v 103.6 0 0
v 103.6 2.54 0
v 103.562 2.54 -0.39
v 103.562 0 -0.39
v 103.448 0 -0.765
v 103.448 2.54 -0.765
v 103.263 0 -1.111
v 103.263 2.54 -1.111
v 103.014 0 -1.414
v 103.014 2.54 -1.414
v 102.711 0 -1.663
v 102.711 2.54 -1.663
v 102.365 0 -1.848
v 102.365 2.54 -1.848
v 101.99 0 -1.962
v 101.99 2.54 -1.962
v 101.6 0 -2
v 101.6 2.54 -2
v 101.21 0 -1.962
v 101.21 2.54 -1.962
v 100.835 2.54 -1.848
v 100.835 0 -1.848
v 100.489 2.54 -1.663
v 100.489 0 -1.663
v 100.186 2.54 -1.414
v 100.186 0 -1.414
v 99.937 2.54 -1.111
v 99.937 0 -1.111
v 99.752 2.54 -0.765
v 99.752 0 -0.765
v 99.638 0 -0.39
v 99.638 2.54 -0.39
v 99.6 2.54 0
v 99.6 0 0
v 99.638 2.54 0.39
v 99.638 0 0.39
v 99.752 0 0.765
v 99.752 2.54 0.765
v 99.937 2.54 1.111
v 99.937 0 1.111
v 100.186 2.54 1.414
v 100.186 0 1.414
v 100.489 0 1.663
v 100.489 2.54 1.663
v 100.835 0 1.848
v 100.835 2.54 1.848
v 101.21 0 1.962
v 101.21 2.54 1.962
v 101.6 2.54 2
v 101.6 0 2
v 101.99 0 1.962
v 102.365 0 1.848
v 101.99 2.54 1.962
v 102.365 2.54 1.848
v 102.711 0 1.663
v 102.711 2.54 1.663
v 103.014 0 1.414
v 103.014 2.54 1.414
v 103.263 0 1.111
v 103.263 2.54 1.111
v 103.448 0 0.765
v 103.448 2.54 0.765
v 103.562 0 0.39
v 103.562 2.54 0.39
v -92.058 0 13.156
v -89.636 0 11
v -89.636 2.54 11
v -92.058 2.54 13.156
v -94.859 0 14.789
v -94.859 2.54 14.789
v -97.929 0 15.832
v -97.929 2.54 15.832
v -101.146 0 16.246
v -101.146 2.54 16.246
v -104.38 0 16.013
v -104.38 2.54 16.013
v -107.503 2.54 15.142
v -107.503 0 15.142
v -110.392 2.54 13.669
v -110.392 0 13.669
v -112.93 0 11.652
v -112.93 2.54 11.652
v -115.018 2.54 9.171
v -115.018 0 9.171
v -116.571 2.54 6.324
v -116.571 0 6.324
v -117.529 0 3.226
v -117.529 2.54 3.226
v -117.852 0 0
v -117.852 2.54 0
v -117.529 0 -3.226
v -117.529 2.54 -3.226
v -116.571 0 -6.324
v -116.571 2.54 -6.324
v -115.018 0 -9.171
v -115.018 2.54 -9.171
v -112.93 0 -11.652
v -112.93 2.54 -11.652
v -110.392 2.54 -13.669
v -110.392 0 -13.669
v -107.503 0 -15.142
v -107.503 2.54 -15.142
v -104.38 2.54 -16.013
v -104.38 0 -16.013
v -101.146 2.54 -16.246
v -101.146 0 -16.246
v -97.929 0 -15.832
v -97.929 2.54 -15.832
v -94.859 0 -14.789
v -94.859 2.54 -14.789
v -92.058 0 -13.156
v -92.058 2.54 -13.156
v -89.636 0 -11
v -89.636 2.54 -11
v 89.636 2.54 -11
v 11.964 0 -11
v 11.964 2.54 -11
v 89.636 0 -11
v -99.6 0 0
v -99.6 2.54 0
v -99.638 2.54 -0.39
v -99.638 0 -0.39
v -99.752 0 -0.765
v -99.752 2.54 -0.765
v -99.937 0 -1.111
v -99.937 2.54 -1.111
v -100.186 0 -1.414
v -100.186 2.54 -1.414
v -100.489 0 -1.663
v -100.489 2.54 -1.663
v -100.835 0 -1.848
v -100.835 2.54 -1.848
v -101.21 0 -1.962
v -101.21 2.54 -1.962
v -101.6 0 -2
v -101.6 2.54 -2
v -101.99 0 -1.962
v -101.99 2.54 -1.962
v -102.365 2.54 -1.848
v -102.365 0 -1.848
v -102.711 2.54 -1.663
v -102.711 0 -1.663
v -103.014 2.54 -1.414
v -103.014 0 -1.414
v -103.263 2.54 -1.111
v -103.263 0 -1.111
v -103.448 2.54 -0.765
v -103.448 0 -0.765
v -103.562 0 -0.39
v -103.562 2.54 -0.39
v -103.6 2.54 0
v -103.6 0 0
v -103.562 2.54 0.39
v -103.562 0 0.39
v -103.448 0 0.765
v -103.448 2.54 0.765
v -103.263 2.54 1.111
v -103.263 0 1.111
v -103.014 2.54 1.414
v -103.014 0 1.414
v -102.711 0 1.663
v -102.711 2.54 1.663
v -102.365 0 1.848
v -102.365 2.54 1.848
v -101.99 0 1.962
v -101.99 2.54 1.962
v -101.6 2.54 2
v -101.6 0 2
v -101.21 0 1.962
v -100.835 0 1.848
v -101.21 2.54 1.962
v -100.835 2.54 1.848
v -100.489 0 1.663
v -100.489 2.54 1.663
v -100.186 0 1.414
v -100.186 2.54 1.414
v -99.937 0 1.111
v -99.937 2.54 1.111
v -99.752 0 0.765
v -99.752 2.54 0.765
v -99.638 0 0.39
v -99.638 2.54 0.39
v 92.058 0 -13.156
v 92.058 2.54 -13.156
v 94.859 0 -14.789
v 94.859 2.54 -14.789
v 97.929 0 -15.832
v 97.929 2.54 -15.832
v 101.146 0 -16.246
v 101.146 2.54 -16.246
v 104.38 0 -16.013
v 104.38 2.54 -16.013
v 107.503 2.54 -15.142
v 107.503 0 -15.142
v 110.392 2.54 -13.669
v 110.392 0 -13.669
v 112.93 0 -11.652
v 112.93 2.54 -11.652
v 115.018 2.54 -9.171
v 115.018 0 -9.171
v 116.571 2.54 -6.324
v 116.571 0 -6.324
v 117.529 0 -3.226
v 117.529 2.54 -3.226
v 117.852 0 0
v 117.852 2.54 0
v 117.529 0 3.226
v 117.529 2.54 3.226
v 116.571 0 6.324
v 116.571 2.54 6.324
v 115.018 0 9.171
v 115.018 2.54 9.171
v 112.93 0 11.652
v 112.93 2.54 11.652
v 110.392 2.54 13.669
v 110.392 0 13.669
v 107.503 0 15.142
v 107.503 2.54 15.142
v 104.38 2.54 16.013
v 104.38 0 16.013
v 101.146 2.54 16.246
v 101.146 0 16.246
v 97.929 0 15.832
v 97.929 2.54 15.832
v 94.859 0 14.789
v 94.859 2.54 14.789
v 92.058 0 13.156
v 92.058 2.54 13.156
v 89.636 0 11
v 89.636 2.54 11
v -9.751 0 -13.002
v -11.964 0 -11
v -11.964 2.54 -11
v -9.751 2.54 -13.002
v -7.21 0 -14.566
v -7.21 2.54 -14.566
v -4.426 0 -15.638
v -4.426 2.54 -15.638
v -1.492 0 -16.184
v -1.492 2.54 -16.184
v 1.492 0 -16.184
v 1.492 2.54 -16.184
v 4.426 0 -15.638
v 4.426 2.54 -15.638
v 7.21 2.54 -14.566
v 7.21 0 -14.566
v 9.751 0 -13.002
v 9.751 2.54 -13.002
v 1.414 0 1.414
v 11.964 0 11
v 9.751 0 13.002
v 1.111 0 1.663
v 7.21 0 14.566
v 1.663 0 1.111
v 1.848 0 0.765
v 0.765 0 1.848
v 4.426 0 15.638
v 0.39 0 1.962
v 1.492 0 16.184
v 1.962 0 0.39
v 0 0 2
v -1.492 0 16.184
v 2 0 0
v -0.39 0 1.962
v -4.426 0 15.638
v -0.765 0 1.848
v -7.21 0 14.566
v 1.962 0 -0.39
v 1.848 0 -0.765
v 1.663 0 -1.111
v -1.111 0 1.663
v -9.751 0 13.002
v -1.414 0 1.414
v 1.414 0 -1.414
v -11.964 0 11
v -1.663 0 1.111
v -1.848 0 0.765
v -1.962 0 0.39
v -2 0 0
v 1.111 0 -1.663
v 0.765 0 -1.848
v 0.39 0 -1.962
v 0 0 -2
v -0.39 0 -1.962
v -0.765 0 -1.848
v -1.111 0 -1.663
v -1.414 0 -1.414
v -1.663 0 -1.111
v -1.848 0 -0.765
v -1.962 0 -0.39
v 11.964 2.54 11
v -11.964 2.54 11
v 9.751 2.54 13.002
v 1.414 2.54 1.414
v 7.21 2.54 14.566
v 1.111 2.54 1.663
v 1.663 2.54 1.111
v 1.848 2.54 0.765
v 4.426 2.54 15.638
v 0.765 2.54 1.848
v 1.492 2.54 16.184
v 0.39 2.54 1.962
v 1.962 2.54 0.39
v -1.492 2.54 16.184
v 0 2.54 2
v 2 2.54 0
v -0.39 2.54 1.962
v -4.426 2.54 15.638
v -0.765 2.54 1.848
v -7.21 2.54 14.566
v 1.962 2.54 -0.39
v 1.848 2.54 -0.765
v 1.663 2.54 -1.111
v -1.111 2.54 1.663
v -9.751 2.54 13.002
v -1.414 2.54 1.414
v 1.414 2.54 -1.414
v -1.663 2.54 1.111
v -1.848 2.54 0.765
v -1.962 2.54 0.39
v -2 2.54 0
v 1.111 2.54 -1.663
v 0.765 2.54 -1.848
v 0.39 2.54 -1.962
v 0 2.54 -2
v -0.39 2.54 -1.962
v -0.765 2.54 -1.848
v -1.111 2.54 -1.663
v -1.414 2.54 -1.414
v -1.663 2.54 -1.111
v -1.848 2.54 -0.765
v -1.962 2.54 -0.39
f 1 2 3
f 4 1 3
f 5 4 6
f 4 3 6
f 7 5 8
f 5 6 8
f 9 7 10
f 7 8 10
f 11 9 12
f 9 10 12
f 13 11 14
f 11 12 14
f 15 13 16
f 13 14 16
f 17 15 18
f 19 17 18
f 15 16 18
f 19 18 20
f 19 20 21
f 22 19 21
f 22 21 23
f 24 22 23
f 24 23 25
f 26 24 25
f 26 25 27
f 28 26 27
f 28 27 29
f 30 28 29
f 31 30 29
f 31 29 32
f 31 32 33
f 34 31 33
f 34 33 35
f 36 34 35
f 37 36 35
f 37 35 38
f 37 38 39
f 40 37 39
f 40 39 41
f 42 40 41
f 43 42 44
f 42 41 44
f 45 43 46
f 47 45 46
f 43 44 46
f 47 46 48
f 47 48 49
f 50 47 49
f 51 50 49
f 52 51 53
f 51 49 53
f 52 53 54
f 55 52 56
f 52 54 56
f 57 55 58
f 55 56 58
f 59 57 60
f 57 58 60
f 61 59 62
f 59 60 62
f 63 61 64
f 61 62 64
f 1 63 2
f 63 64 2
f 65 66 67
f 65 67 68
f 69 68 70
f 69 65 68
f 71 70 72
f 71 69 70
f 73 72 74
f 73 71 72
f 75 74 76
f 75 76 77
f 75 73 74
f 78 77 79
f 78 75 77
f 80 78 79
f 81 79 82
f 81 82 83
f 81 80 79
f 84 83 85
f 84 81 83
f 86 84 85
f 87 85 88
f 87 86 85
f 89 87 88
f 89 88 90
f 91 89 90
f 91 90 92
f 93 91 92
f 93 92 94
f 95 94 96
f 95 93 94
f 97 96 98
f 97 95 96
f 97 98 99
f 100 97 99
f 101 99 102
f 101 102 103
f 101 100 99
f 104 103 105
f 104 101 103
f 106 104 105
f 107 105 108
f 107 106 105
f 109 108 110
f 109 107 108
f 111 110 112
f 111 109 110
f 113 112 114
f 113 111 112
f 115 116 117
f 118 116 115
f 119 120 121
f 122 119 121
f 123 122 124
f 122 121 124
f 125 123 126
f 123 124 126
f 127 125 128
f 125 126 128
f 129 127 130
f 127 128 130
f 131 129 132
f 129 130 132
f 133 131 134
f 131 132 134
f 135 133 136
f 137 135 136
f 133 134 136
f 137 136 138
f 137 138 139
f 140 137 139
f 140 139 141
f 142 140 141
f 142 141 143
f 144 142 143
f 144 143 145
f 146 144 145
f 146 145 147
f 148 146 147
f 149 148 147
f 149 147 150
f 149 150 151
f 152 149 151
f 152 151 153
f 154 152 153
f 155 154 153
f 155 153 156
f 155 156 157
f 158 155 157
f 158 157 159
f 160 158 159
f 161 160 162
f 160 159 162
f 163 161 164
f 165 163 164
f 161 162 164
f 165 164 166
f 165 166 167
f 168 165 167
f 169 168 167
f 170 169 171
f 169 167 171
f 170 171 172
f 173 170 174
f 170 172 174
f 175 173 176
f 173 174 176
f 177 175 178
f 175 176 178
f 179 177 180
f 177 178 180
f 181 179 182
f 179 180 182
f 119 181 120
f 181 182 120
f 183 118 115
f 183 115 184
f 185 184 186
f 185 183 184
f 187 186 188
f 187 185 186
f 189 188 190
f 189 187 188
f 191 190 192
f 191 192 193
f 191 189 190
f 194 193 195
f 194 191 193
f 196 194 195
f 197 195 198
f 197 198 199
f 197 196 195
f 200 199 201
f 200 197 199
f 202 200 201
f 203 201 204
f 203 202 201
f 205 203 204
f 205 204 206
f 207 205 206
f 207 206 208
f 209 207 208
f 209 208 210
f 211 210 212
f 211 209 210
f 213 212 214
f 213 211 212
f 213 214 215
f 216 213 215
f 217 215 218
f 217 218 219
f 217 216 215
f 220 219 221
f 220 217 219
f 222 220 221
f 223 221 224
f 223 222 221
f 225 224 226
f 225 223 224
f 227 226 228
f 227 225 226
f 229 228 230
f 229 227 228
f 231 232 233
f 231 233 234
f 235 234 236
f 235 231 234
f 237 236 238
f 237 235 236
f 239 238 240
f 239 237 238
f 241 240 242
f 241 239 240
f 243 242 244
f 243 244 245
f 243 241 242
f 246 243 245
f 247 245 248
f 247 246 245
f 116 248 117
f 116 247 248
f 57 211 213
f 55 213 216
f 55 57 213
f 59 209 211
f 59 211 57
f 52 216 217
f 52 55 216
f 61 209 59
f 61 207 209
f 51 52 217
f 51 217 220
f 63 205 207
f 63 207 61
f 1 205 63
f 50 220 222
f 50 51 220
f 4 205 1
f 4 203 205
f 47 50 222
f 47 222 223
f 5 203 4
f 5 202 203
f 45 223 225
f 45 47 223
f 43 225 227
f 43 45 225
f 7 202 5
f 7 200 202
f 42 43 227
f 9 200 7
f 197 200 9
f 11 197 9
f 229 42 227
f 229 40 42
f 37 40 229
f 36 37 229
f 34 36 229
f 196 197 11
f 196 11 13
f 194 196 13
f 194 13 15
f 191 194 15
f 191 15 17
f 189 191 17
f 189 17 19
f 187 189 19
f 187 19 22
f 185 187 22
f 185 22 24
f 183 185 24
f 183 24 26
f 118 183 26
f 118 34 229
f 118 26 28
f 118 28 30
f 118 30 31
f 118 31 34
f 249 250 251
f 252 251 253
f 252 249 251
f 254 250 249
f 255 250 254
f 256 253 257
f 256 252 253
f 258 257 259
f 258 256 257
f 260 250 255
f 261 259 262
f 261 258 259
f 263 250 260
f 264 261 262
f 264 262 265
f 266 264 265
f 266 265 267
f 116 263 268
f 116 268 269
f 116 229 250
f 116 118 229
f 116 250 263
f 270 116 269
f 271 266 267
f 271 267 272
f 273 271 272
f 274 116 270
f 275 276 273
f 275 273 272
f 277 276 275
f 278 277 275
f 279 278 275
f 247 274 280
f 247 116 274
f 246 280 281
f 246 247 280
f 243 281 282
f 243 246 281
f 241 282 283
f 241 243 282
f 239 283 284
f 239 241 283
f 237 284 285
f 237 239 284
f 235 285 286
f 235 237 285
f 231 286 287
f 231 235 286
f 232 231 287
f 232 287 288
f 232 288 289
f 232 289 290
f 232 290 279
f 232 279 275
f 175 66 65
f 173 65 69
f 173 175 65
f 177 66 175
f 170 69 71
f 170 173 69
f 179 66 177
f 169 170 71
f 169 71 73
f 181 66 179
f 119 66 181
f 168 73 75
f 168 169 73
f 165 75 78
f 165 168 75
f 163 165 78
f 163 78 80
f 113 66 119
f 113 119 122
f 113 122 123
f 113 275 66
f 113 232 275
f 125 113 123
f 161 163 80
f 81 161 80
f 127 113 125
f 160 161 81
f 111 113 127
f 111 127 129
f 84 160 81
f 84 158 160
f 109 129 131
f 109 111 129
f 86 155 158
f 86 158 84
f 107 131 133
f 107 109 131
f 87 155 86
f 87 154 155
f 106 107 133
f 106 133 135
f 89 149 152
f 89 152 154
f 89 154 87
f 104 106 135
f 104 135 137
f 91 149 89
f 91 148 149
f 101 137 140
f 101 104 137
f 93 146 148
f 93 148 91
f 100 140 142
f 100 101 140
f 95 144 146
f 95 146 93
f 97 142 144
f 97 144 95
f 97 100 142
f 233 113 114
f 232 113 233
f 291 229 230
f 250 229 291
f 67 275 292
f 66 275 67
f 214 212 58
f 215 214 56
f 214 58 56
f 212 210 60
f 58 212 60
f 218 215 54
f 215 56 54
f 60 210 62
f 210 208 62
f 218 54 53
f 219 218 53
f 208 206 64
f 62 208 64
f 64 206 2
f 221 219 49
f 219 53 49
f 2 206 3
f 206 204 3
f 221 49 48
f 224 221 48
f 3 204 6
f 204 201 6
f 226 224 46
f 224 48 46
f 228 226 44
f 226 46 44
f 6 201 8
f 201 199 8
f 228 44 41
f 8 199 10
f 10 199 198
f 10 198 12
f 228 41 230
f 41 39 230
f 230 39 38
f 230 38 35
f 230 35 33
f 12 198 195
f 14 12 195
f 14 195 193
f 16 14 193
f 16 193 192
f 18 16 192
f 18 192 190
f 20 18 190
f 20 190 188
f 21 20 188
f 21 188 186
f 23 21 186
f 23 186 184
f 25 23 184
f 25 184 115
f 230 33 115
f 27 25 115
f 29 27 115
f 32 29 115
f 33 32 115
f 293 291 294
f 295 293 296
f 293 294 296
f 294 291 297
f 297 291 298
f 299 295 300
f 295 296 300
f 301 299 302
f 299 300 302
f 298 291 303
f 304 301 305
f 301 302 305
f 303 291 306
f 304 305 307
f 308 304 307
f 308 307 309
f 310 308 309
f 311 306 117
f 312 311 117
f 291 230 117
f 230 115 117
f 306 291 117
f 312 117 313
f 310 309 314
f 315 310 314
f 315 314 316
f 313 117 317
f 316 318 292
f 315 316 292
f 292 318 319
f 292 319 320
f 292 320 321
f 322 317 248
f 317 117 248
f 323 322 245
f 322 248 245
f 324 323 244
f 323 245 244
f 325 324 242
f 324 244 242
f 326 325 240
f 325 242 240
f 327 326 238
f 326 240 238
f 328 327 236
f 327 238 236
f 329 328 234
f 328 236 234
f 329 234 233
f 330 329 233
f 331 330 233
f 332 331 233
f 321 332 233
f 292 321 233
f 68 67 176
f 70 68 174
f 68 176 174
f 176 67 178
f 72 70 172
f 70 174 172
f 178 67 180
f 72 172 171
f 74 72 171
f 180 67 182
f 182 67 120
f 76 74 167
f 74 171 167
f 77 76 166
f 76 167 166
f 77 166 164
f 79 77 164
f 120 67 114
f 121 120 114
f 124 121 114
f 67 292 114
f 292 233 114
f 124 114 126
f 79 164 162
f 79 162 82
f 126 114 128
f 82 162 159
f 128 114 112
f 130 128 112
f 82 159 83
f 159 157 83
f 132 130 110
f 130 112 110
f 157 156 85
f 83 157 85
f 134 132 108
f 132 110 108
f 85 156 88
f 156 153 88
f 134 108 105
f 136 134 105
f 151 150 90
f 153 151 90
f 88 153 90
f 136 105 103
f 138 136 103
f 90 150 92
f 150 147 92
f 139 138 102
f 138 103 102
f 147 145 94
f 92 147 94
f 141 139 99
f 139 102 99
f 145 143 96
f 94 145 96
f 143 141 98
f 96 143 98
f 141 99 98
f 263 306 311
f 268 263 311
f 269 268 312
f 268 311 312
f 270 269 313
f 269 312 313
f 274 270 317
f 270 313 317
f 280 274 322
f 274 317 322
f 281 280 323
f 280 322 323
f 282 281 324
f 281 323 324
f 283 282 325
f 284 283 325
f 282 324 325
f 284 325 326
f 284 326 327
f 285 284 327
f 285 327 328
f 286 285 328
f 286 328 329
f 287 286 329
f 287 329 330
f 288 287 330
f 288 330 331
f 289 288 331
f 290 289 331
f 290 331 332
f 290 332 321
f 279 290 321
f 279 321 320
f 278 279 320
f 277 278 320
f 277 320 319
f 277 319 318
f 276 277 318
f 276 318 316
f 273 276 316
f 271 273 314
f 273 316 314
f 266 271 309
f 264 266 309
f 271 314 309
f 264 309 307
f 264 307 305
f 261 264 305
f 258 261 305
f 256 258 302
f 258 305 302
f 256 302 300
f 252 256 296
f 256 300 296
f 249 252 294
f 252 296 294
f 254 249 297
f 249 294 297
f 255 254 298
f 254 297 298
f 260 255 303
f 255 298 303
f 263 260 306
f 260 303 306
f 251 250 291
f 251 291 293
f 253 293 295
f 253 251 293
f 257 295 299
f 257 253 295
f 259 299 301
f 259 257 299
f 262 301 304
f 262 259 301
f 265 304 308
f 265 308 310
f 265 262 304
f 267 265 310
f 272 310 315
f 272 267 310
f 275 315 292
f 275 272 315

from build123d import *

# Parameters (mm, degrees)
BOSS_EXTRUDE1_DEPTH     = 2.54
SKETCH2_R               = 2
CUT_EXTRUDE1_DEPTH      = 1
CUT_EXTRUDE1_DEPTH_BACK = 3.54


with BuildPart() as part:
    # Sketch1 → Boss-Extrude1 (new body)
    with BuildSketch(Plane(origin=(0, 0, 0), x_dir=(1, 0, 0), z_dir=(0, 1, 0))):
        with BuildLine():
            Line((-89.636017598, 11), (-11.963982402, 11))
            ThreePointArc((-11.963982402, 11), (0, 16.252288298), (11.963982402, 11))
            Line((11.963982402, 11), (89.636017598, 11))
            ThreePointArc((89.636017598, 11), (117.852288298, 0), (89.636017598, -11))
            Line((89.636017598, -11), (11.963982402, -11))
            ThreePointArc((11.963982402, -11), (0, -16.252288298), (-11.963982402, -11))
            Line((-11.963982402, -11), (-89.636017598, -11))
            ThreePointArc((-89.636017598, -11), (-117.852288298, 0), (-89.636017598, 11))
        make_face()
    extrude(amount=BOSS_EXTRUDE1_DEPTH)

    # Sketch2 → Cut-Extrude1 (cut, two sides)
    with BuildSketch(Plane(origin=(0, 2.54, 0), x_dir=(1, 0, 0), z_dir=(0, 1, 0))) as cut_extrude1_sk:
        with Locations((-101.6, 0)):
            Circle(SKETCH2_R)
        with Locations((101.6, 0)):
            Circle(SKETCH2_R)
        Circle(SKETCH2_R)
    extrude(amount=CUT_EXTRUDE1_DEPTH, mode=Mode.SUBTRACT)
    extrude(cut_extrude1_sk.sketch, amount=-CUT_EXTRUDE1_DEPTH_BACK, mode=Mode.SUBTRACT)


solid = part.part
